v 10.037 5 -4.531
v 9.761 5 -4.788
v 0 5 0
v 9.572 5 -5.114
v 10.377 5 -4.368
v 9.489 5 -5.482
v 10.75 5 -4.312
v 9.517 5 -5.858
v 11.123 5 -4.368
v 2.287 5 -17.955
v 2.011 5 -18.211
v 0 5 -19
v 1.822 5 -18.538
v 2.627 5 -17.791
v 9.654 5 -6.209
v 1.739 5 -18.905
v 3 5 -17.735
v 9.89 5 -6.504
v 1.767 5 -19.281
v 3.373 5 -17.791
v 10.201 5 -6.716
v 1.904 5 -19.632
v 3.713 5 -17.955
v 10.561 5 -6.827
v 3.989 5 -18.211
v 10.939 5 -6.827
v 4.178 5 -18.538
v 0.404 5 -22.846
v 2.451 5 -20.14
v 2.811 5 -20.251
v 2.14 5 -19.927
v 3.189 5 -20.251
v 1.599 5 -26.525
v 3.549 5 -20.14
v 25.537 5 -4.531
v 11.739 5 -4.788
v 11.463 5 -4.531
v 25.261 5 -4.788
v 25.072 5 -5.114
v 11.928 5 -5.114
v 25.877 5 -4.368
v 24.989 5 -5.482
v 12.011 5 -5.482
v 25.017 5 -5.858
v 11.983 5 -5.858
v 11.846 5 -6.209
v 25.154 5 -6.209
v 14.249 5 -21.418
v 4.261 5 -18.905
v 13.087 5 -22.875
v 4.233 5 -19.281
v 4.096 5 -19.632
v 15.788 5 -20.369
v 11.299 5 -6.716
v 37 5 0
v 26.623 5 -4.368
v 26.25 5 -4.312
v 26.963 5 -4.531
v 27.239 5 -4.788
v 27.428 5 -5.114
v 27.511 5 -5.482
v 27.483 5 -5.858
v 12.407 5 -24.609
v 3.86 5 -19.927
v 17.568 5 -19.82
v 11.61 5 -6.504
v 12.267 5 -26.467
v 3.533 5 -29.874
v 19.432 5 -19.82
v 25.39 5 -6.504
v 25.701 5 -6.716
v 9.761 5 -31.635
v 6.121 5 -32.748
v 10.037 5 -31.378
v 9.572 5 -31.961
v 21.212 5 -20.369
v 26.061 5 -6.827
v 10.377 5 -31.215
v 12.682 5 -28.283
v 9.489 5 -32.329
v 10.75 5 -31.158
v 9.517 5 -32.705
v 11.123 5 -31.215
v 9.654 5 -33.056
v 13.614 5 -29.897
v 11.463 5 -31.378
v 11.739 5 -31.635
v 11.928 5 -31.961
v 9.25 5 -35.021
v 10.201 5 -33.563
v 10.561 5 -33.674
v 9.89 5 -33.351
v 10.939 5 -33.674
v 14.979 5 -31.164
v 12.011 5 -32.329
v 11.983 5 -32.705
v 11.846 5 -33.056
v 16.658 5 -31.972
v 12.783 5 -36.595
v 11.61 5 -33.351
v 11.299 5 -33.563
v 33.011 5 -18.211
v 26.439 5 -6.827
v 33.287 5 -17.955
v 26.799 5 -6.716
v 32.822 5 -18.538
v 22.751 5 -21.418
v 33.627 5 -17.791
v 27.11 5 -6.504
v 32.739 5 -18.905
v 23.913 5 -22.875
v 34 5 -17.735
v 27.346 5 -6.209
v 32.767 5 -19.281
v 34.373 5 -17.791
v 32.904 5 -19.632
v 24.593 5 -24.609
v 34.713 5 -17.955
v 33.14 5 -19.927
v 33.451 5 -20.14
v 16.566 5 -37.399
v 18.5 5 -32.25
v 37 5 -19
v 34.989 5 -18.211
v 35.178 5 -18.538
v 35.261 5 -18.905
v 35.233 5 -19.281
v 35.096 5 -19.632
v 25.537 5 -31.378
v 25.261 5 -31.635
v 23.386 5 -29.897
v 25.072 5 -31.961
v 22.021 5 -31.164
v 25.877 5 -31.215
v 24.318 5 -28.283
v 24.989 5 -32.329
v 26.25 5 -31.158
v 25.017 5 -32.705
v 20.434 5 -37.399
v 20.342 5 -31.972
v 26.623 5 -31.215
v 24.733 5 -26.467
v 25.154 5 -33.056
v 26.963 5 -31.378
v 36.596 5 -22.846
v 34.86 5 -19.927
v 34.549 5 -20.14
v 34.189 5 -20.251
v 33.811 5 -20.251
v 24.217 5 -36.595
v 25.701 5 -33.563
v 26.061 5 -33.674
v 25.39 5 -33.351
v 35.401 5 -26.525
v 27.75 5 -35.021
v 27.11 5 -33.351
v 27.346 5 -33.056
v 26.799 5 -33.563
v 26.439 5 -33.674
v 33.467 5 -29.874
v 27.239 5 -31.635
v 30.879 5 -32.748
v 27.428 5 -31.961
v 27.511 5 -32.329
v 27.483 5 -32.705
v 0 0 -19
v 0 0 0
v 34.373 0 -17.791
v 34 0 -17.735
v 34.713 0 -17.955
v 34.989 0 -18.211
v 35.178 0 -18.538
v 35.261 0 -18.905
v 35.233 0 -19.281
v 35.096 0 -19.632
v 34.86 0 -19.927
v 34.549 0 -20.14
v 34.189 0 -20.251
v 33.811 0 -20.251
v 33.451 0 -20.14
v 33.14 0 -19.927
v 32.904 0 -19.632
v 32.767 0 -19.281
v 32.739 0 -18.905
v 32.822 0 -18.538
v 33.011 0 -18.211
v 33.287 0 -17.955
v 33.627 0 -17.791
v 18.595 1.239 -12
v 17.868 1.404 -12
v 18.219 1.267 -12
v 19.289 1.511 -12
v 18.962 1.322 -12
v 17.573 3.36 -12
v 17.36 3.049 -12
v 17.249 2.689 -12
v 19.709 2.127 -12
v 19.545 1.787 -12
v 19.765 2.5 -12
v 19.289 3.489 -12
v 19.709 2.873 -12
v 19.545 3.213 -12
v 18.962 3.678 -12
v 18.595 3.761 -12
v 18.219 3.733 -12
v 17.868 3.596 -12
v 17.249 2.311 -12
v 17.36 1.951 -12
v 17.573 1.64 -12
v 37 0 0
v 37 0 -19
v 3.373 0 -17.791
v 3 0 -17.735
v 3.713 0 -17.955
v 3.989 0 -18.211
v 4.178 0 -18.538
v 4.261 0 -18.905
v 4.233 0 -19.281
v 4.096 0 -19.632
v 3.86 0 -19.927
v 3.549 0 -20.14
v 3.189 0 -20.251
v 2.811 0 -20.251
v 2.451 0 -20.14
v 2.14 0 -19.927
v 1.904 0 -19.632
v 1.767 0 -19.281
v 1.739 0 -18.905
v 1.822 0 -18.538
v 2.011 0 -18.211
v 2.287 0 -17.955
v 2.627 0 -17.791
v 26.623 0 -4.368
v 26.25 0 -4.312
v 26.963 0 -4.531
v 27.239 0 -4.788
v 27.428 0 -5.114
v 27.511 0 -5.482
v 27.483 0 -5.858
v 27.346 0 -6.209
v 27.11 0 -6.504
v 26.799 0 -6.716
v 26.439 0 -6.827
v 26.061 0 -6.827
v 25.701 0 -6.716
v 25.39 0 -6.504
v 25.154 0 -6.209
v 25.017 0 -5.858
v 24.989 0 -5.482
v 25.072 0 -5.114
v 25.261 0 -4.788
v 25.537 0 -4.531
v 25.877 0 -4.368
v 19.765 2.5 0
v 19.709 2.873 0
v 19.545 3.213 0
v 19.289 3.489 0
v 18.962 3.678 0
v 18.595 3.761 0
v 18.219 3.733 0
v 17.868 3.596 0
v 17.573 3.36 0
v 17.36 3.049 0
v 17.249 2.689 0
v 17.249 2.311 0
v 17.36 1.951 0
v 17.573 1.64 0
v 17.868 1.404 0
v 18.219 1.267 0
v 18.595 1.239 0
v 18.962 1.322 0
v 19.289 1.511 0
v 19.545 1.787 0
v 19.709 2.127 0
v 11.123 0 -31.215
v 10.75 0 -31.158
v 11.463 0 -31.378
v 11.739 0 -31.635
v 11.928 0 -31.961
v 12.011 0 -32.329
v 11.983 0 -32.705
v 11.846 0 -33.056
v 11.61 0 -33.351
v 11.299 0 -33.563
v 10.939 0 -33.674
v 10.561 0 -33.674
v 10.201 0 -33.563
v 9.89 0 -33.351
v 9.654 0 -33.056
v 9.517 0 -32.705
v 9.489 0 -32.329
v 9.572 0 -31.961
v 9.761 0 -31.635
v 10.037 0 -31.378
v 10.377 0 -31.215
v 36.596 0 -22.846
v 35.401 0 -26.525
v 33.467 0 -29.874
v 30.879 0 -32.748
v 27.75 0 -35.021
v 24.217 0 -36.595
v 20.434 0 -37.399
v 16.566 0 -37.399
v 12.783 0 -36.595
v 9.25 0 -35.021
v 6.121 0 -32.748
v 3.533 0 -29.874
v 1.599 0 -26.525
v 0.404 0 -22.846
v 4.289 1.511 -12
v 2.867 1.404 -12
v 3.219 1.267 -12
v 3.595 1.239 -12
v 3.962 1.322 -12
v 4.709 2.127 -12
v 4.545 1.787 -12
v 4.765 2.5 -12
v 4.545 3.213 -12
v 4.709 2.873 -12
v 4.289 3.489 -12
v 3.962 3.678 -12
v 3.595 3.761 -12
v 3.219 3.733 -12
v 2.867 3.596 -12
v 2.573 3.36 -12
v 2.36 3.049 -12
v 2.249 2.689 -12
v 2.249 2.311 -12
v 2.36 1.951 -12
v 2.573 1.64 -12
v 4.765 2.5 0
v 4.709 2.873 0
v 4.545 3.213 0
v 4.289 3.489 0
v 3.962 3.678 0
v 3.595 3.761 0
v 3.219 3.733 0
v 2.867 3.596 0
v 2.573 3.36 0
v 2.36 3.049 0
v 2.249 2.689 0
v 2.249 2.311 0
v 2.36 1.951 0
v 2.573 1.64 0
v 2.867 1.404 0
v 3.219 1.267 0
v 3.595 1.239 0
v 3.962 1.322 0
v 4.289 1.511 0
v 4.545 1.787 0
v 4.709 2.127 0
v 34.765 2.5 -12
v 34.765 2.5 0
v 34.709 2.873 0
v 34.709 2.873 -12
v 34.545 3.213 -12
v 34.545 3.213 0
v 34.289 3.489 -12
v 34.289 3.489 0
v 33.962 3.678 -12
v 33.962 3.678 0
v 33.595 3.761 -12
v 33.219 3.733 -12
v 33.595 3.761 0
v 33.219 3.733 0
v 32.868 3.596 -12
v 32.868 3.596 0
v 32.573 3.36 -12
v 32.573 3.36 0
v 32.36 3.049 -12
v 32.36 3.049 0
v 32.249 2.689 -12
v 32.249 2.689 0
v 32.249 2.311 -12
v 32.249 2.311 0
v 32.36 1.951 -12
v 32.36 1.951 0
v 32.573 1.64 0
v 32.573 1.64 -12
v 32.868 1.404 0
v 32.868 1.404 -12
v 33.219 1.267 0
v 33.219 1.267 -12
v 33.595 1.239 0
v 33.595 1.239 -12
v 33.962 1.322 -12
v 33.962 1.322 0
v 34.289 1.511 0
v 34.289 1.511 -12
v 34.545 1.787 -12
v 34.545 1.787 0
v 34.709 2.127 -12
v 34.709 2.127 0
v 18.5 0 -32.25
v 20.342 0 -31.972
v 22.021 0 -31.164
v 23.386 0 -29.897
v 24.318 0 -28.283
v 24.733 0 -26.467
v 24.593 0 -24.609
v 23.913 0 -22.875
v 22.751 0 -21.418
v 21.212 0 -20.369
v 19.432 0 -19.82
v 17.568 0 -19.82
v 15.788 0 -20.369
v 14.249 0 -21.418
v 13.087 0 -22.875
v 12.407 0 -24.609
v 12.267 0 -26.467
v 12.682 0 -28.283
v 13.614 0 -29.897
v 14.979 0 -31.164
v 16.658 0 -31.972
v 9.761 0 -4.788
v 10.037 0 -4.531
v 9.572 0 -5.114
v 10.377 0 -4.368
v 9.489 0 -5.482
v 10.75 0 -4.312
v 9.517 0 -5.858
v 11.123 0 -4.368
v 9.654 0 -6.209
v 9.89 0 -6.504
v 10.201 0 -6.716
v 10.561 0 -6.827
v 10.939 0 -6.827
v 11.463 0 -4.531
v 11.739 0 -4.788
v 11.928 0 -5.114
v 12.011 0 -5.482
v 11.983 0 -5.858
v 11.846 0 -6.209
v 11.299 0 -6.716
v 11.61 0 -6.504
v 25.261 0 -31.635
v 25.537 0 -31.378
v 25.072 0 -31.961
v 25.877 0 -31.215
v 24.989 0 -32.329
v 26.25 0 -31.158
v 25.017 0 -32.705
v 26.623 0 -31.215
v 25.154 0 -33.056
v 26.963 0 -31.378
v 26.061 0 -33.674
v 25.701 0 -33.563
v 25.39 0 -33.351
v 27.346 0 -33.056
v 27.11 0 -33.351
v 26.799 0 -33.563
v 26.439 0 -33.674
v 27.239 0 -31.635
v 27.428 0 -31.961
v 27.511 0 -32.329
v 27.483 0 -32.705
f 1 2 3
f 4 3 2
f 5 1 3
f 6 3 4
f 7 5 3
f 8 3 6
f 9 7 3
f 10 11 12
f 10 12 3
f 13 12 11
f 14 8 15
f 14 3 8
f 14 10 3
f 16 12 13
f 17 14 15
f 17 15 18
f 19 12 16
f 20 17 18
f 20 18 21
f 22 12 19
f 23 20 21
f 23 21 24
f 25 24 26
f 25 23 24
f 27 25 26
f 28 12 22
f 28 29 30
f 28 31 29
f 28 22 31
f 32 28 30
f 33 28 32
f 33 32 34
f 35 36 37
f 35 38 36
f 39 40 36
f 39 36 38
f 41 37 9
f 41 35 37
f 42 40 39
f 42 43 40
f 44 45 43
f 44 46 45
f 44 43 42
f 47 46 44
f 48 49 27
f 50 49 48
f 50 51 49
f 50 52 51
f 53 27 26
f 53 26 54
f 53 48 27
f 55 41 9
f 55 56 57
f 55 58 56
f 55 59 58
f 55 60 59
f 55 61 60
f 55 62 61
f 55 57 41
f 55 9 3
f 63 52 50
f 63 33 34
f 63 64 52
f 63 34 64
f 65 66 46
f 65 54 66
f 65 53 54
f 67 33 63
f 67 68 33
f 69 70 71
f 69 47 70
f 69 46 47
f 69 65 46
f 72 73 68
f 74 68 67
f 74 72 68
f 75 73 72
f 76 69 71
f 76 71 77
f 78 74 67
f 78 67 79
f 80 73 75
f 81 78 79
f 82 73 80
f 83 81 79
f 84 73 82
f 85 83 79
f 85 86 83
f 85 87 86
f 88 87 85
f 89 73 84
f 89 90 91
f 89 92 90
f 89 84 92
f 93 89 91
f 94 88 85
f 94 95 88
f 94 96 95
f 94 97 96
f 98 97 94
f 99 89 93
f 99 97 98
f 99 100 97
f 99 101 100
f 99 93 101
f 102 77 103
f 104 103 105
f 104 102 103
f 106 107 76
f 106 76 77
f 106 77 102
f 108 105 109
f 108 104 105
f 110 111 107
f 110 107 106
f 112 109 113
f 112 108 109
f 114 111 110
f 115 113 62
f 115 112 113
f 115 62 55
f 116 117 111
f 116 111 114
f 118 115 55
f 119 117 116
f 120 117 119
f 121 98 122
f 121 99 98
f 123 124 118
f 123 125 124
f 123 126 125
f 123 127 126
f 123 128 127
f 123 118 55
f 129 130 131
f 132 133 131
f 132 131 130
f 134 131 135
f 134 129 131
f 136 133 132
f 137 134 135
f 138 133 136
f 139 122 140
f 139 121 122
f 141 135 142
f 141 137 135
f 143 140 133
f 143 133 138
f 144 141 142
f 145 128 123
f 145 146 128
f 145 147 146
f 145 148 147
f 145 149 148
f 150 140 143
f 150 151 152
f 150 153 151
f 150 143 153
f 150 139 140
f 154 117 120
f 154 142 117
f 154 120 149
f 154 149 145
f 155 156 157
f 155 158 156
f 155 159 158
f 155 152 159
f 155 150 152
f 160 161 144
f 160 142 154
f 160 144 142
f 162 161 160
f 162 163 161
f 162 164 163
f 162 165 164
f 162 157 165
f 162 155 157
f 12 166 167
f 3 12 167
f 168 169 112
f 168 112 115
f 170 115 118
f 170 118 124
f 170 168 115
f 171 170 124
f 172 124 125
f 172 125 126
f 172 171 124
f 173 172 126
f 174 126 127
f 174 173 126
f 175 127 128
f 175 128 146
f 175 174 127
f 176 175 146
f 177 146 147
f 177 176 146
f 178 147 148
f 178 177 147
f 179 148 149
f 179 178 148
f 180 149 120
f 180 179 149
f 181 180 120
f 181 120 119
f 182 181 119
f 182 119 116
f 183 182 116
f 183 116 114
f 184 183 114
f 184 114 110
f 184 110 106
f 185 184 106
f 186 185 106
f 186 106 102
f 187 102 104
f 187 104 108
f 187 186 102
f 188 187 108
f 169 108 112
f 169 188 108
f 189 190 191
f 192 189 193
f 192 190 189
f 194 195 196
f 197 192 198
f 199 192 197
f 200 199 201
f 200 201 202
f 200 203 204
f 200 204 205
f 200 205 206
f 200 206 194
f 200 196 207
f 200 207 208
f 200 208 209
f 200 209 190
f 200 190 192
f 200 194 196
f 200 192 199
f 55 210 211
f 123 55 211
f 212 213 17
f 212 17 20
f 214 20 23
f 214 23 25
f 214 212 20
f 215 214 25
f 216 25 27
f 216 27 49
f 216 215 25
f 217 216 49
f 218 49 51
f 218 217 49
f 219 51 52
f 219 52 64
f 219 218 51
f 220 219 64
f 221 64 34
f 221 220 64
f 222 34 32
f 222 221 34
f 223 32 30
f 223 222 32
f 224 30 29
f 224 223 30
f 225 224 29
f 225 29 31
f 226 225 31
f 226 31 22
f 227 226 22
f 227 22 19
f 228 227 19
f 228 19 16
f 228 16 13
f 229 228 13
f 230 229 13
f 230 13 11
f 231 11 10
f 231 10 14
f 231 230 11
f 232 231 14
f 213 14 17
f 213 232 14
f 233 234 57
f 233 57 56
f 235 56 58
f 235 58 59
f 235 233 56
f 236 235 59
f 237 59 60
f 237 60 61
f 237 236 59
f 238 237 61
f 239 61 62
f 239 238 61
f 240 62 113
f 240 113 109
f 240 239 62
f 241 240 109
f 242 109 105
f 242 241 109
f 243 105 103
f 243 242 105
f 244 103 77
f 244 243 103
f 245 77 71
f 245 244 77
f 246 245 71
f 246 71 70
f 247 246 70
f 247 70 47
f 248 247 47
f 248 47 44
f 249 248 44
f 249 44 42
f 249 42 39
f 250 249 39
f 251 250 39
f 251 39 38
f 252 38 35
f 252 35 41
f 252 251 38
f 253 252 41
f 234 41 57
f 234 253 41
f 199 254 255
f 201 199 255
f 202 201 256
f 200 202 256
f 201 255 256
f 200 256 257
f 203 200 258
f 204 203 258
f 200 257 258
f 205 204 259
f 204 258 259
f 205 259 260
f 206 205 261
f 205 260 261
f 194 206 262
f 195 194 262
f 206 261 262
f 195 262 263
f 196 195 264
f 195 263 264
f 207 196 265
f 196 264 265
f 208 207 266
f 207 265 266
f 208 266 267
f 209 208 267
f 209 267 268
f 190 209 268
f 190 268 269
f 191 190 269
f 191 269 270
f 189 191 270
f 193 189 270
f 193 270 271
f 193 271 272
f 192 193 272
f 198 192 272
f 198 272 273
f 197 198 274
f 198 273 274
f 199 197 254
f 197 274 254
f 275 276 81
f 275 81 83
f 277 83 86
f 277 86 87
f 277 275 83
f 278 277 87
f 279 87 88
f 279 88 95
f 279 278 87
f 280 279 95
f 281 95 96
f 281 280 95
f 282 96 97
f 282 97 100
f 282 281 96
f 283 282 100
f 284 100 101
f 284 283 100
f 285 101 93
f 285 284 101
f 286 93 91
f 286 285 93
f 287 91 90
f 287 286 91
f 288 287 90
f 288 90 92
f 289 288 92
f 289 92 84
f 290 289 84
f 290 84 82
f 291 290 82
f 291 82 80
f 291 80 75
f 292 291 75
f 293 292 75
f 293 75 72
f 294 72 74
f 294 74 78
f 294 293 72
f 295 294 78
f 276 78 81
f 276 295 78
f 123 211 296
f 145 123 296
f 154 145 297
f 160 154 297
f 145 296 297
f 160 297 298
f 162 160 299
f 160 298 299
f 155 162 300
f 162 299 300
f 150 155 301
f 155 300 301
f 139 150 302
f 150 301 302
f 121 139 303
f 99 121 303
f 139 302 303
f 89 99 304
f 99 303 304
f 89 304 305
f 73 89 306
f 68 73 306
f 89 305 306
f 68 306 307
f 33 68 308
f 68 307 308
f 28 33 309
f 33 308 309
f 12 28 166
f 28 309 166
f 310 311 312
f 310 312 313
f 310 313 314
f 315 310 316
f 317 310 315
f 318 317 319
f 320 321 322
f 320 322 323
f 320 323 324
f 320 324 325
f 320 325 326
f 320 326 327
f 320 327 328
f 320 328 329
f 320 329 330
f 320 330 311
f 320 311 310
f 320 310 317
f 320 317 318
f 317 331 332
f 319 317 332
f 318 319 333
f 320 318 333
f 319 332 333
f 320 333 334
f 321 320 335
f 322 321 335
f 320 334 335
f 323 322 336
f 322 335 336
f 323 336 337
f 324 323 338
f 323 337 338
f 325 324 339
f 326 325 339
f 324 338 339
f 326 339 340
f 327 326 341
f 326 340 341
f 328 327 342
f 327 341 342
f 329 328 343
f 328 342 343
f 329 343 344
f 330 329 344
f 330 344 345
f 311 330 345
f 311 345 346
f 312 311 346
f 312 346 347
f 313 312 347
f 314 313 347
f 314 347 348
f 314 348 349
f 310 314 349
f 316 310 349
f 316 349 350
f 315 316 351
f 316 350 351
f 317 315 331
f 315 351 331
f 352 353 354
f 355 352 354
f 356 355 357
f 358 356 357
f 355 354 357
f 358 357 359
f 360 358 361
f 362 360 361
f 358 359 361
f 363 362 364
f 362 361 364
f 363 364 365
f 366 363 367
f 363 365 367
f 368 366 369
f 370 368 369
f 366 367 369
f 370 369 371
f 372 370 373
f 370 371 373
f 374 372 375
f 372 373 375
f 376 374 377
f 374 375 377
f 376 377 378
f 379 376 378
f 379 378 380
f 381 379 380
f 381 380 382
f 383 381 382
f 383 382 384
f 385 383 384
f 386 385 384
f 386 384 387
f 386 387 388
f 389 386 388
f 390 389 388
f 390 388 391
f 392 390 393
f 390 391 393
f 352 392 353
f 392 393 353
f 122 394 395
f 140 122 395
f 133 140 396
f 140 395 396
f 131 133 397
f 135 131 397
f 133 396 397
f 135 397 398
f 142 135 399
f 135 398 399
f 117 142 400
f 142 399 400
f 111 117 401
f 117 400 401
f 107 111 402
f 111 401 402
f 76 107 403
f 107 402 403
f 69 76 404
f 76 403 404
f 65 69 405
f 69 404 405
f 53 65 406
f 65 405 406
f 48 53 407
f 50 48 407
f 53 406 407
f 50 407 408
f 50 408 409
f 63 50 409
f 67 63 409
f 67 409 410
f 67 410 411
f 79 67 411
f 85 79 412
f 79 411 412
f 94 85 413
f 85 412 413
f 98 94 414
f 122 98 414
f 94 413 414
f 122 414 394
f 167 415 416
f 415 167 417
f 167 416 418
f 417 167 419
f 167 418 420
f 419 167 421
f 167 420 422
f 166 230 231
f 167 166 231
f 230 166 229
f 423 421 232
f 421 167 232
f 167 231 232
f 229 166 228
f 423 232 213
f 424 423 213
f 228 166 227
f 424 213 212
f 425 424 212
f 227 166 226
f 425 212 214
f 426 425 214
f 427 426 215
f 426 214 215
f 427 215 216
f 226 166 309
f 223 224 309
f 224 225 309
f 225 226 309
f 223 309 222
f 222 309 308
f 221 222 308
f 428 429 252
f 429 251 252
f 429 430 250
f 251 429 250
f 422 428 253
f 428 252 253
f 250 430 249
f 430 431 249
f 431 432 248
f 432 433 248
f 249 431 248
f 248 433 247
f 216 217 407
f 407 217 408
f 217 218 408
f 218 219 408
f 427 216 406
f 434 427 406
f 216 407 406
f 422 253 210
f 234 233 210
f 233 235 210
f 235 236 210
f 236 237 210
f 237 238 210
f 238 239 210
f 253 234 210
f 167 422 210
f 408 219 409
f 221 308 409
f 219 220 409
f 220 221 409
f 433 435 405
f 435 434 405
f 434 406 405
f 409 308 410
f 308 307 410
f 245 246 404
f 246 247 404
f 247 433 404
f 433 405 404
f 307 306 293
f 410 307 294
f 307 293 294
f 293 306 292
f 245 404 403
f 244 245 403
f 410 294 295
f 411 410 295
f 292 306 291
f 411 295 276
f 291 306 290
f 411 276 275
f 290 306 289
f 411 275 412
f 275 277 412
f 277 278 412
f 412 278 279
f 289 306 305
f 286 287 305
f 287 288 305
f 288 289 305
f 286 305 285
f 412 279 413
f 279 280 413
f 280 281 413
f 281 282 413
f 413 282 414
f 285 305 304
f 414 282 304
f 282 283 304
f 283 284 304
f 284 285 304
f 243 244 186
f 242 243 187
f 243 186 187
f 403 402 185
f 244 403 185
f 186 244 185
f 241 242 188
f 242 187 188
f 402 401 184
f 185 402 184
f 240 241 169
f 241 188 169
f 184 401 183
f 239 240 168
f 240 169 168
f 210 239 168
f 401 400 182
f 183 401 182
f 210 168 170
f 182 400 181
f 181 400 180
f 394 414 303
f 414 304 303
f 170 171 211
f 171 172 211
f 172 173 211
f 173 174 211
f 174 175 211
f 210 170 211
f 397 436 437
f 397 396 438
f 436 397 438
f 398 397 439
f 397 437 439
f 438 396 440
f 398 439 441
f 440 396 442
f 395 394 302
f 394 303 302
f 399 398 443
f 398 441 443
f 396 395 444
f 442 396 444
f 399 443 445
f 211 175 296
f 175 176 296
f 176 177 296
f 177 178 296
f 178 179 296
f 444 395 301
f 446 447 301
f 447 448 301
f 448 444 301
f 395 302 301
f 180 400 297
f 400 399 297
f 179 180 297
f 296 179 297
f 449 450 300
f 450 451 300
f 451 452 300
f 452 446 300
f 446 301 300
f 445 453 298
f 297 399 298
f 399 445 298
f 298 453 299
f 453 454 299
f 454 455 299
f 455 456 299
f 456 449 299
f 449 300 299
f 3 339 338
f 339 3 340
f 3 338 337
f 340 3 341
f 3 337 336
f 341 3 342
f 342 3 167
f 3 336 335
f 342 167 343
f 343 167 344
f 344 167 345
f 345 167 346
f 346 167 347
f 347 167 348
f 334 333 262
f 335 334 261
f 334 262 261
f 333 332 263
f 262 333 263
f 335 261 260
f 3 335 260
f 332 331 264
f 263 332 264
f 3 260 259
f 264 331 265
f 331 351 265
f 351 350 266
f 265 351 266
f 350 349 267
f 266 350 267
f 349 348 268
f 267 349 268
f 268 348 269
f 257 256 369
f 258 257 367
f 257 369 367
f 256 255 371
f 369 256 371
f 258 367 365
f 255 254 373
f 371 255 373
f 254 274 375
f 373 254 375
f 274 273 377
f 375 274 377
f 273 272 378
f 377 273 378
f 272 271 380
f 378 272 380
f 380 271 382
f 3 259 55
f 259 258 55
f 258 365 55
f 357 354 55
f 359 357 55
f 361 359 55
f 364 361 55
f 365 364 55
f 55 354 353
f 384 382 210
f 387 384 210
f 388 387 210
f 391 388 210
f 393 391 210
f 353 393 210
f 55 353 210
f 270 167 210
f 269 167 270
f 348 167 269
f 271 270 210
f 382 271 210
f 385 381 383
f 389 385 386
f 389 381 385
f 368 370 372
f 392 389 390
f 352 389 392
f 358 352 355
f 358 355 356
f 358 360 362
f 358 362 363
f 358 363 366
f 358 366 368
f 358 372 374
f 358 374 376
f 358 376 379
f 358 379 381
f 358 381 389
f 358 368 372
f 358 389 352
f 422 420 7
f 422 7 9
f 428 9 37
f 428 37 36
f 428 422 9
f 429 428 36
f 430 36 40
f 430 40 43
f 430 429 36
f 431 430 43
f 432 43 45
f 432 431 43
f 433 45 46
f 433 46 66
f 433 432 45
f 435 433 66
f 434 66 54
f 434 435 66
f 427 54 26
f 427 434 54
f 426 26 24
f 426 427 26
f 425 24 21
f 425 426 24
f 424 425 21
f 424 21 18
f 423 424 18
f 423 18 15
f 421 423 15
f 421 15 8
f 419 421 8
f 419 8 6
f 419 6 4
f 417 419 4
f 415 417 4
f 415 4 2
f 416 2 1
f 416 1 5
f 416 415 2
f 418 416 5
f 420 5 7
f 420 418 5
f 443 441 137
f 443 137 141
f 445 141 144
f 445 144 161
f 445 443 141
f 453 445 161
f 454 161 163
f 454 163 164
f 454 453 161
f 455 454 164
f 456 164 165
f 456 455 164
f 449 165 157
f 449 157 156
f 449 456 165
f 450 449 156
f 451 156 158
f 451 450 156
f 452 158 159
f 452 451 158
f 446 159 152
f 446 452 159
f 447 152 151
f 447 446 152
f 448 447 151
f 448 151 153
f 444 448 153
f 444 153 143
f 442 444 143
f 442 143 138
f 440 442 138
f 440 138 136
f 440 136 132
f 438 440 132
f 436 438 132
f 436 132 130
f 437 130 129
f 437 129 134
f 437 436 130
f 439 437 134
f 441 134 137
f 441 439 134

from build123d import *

# Parameters (mm, degrees)
ESBO_O2_R                = 1.265
RESSALTO_EXTRUS_O1_DEPTH = 5
ESBO_O3_R                = 6.25
CORTE_EXTRUS_O1_DEPTH    = 5
ESBO_O4_R                = 1.265
CORTE_EXTRUS_O2_DEPTH    = 12


with BuildPart() as part:
    # Esboço2 → Ressalto-extrusão1 (new body)
    with BuildSketch(Plane(origin=(0, 0, 0), x_dir=(1, 0, 0), z_dir=(0, 1, 0))):
        with BuildLine():
            Line((0, 0), (37, 0))
            Line((37, 0), (37, 19))
            ThreePointArc((37, 19), (18.5, 37.5), (0, 19))
            Line((0, 19), (0, 0))
        make_face()
        with Locations(Location((10.75, 32.423393759, 0), (0, 0, 270))):
            Circle(ESBO_O2_R, mode=Mode.SUBTRACT)
        with Locations(Location((26.25, 32.423393759, 0), (0, 0, 270))):
            Circle(ESBO_O2_R, mode=Mode.SUBTRACT)
        with Locations(Location((34, 19, 0), (0, 0, 270))):
            Circle(ESBO_O2_R, mode=Mode.SUBTRACT)
        with Locations(Location((26.25, 5.576606241, 0), (0, 0, 270))):
            Circle(ESBO_O2_R, mode=Mode.SUBTRACT)
        with Locations(Location((10.75, 5.576606241, 0), (0, 0, 270))):
            Circle(ESBO_O2_R, mode=Mode.SUBTRACT)
        with Locations(Location((3, 19, 0), (0, 0, 270))):
            Circle(ESBO_O2_R, mode=Mode.SUBTRACT)
    extrude(amount=RESSALTO_EXTRUS_O1_DEPTH)

    # Esboço3 → Corte-extrusão1 (cut)
    with BuildSketch(Plane.XZ):
        with Locations(Location((18.5, -26, 0), (0, 0, 270))):
            Circle(ESBO_O3_R)
    extrude(amount=-CORTE_EXTRUS_O1_DEPTH, mode=Mode.SUBTRACT)

    # Esboço4 → Corte-extrusão2 (cut)
    with BuildSketch(Plane.XY):
        with Locations((3.5, 2.5)):
            Circle(ESBO_O4_R)
        with Locations((18.5, 2.5)):
            Circle(ESBO_O4_R)
        with Locations((33.5, 2.5)):
            Circle(ESBO_O4_R)
    extrude(amount=-CORTE_EXTRUS_O2_DEPTH, mode=Mode.SUBTRACT)


solid = part.part
